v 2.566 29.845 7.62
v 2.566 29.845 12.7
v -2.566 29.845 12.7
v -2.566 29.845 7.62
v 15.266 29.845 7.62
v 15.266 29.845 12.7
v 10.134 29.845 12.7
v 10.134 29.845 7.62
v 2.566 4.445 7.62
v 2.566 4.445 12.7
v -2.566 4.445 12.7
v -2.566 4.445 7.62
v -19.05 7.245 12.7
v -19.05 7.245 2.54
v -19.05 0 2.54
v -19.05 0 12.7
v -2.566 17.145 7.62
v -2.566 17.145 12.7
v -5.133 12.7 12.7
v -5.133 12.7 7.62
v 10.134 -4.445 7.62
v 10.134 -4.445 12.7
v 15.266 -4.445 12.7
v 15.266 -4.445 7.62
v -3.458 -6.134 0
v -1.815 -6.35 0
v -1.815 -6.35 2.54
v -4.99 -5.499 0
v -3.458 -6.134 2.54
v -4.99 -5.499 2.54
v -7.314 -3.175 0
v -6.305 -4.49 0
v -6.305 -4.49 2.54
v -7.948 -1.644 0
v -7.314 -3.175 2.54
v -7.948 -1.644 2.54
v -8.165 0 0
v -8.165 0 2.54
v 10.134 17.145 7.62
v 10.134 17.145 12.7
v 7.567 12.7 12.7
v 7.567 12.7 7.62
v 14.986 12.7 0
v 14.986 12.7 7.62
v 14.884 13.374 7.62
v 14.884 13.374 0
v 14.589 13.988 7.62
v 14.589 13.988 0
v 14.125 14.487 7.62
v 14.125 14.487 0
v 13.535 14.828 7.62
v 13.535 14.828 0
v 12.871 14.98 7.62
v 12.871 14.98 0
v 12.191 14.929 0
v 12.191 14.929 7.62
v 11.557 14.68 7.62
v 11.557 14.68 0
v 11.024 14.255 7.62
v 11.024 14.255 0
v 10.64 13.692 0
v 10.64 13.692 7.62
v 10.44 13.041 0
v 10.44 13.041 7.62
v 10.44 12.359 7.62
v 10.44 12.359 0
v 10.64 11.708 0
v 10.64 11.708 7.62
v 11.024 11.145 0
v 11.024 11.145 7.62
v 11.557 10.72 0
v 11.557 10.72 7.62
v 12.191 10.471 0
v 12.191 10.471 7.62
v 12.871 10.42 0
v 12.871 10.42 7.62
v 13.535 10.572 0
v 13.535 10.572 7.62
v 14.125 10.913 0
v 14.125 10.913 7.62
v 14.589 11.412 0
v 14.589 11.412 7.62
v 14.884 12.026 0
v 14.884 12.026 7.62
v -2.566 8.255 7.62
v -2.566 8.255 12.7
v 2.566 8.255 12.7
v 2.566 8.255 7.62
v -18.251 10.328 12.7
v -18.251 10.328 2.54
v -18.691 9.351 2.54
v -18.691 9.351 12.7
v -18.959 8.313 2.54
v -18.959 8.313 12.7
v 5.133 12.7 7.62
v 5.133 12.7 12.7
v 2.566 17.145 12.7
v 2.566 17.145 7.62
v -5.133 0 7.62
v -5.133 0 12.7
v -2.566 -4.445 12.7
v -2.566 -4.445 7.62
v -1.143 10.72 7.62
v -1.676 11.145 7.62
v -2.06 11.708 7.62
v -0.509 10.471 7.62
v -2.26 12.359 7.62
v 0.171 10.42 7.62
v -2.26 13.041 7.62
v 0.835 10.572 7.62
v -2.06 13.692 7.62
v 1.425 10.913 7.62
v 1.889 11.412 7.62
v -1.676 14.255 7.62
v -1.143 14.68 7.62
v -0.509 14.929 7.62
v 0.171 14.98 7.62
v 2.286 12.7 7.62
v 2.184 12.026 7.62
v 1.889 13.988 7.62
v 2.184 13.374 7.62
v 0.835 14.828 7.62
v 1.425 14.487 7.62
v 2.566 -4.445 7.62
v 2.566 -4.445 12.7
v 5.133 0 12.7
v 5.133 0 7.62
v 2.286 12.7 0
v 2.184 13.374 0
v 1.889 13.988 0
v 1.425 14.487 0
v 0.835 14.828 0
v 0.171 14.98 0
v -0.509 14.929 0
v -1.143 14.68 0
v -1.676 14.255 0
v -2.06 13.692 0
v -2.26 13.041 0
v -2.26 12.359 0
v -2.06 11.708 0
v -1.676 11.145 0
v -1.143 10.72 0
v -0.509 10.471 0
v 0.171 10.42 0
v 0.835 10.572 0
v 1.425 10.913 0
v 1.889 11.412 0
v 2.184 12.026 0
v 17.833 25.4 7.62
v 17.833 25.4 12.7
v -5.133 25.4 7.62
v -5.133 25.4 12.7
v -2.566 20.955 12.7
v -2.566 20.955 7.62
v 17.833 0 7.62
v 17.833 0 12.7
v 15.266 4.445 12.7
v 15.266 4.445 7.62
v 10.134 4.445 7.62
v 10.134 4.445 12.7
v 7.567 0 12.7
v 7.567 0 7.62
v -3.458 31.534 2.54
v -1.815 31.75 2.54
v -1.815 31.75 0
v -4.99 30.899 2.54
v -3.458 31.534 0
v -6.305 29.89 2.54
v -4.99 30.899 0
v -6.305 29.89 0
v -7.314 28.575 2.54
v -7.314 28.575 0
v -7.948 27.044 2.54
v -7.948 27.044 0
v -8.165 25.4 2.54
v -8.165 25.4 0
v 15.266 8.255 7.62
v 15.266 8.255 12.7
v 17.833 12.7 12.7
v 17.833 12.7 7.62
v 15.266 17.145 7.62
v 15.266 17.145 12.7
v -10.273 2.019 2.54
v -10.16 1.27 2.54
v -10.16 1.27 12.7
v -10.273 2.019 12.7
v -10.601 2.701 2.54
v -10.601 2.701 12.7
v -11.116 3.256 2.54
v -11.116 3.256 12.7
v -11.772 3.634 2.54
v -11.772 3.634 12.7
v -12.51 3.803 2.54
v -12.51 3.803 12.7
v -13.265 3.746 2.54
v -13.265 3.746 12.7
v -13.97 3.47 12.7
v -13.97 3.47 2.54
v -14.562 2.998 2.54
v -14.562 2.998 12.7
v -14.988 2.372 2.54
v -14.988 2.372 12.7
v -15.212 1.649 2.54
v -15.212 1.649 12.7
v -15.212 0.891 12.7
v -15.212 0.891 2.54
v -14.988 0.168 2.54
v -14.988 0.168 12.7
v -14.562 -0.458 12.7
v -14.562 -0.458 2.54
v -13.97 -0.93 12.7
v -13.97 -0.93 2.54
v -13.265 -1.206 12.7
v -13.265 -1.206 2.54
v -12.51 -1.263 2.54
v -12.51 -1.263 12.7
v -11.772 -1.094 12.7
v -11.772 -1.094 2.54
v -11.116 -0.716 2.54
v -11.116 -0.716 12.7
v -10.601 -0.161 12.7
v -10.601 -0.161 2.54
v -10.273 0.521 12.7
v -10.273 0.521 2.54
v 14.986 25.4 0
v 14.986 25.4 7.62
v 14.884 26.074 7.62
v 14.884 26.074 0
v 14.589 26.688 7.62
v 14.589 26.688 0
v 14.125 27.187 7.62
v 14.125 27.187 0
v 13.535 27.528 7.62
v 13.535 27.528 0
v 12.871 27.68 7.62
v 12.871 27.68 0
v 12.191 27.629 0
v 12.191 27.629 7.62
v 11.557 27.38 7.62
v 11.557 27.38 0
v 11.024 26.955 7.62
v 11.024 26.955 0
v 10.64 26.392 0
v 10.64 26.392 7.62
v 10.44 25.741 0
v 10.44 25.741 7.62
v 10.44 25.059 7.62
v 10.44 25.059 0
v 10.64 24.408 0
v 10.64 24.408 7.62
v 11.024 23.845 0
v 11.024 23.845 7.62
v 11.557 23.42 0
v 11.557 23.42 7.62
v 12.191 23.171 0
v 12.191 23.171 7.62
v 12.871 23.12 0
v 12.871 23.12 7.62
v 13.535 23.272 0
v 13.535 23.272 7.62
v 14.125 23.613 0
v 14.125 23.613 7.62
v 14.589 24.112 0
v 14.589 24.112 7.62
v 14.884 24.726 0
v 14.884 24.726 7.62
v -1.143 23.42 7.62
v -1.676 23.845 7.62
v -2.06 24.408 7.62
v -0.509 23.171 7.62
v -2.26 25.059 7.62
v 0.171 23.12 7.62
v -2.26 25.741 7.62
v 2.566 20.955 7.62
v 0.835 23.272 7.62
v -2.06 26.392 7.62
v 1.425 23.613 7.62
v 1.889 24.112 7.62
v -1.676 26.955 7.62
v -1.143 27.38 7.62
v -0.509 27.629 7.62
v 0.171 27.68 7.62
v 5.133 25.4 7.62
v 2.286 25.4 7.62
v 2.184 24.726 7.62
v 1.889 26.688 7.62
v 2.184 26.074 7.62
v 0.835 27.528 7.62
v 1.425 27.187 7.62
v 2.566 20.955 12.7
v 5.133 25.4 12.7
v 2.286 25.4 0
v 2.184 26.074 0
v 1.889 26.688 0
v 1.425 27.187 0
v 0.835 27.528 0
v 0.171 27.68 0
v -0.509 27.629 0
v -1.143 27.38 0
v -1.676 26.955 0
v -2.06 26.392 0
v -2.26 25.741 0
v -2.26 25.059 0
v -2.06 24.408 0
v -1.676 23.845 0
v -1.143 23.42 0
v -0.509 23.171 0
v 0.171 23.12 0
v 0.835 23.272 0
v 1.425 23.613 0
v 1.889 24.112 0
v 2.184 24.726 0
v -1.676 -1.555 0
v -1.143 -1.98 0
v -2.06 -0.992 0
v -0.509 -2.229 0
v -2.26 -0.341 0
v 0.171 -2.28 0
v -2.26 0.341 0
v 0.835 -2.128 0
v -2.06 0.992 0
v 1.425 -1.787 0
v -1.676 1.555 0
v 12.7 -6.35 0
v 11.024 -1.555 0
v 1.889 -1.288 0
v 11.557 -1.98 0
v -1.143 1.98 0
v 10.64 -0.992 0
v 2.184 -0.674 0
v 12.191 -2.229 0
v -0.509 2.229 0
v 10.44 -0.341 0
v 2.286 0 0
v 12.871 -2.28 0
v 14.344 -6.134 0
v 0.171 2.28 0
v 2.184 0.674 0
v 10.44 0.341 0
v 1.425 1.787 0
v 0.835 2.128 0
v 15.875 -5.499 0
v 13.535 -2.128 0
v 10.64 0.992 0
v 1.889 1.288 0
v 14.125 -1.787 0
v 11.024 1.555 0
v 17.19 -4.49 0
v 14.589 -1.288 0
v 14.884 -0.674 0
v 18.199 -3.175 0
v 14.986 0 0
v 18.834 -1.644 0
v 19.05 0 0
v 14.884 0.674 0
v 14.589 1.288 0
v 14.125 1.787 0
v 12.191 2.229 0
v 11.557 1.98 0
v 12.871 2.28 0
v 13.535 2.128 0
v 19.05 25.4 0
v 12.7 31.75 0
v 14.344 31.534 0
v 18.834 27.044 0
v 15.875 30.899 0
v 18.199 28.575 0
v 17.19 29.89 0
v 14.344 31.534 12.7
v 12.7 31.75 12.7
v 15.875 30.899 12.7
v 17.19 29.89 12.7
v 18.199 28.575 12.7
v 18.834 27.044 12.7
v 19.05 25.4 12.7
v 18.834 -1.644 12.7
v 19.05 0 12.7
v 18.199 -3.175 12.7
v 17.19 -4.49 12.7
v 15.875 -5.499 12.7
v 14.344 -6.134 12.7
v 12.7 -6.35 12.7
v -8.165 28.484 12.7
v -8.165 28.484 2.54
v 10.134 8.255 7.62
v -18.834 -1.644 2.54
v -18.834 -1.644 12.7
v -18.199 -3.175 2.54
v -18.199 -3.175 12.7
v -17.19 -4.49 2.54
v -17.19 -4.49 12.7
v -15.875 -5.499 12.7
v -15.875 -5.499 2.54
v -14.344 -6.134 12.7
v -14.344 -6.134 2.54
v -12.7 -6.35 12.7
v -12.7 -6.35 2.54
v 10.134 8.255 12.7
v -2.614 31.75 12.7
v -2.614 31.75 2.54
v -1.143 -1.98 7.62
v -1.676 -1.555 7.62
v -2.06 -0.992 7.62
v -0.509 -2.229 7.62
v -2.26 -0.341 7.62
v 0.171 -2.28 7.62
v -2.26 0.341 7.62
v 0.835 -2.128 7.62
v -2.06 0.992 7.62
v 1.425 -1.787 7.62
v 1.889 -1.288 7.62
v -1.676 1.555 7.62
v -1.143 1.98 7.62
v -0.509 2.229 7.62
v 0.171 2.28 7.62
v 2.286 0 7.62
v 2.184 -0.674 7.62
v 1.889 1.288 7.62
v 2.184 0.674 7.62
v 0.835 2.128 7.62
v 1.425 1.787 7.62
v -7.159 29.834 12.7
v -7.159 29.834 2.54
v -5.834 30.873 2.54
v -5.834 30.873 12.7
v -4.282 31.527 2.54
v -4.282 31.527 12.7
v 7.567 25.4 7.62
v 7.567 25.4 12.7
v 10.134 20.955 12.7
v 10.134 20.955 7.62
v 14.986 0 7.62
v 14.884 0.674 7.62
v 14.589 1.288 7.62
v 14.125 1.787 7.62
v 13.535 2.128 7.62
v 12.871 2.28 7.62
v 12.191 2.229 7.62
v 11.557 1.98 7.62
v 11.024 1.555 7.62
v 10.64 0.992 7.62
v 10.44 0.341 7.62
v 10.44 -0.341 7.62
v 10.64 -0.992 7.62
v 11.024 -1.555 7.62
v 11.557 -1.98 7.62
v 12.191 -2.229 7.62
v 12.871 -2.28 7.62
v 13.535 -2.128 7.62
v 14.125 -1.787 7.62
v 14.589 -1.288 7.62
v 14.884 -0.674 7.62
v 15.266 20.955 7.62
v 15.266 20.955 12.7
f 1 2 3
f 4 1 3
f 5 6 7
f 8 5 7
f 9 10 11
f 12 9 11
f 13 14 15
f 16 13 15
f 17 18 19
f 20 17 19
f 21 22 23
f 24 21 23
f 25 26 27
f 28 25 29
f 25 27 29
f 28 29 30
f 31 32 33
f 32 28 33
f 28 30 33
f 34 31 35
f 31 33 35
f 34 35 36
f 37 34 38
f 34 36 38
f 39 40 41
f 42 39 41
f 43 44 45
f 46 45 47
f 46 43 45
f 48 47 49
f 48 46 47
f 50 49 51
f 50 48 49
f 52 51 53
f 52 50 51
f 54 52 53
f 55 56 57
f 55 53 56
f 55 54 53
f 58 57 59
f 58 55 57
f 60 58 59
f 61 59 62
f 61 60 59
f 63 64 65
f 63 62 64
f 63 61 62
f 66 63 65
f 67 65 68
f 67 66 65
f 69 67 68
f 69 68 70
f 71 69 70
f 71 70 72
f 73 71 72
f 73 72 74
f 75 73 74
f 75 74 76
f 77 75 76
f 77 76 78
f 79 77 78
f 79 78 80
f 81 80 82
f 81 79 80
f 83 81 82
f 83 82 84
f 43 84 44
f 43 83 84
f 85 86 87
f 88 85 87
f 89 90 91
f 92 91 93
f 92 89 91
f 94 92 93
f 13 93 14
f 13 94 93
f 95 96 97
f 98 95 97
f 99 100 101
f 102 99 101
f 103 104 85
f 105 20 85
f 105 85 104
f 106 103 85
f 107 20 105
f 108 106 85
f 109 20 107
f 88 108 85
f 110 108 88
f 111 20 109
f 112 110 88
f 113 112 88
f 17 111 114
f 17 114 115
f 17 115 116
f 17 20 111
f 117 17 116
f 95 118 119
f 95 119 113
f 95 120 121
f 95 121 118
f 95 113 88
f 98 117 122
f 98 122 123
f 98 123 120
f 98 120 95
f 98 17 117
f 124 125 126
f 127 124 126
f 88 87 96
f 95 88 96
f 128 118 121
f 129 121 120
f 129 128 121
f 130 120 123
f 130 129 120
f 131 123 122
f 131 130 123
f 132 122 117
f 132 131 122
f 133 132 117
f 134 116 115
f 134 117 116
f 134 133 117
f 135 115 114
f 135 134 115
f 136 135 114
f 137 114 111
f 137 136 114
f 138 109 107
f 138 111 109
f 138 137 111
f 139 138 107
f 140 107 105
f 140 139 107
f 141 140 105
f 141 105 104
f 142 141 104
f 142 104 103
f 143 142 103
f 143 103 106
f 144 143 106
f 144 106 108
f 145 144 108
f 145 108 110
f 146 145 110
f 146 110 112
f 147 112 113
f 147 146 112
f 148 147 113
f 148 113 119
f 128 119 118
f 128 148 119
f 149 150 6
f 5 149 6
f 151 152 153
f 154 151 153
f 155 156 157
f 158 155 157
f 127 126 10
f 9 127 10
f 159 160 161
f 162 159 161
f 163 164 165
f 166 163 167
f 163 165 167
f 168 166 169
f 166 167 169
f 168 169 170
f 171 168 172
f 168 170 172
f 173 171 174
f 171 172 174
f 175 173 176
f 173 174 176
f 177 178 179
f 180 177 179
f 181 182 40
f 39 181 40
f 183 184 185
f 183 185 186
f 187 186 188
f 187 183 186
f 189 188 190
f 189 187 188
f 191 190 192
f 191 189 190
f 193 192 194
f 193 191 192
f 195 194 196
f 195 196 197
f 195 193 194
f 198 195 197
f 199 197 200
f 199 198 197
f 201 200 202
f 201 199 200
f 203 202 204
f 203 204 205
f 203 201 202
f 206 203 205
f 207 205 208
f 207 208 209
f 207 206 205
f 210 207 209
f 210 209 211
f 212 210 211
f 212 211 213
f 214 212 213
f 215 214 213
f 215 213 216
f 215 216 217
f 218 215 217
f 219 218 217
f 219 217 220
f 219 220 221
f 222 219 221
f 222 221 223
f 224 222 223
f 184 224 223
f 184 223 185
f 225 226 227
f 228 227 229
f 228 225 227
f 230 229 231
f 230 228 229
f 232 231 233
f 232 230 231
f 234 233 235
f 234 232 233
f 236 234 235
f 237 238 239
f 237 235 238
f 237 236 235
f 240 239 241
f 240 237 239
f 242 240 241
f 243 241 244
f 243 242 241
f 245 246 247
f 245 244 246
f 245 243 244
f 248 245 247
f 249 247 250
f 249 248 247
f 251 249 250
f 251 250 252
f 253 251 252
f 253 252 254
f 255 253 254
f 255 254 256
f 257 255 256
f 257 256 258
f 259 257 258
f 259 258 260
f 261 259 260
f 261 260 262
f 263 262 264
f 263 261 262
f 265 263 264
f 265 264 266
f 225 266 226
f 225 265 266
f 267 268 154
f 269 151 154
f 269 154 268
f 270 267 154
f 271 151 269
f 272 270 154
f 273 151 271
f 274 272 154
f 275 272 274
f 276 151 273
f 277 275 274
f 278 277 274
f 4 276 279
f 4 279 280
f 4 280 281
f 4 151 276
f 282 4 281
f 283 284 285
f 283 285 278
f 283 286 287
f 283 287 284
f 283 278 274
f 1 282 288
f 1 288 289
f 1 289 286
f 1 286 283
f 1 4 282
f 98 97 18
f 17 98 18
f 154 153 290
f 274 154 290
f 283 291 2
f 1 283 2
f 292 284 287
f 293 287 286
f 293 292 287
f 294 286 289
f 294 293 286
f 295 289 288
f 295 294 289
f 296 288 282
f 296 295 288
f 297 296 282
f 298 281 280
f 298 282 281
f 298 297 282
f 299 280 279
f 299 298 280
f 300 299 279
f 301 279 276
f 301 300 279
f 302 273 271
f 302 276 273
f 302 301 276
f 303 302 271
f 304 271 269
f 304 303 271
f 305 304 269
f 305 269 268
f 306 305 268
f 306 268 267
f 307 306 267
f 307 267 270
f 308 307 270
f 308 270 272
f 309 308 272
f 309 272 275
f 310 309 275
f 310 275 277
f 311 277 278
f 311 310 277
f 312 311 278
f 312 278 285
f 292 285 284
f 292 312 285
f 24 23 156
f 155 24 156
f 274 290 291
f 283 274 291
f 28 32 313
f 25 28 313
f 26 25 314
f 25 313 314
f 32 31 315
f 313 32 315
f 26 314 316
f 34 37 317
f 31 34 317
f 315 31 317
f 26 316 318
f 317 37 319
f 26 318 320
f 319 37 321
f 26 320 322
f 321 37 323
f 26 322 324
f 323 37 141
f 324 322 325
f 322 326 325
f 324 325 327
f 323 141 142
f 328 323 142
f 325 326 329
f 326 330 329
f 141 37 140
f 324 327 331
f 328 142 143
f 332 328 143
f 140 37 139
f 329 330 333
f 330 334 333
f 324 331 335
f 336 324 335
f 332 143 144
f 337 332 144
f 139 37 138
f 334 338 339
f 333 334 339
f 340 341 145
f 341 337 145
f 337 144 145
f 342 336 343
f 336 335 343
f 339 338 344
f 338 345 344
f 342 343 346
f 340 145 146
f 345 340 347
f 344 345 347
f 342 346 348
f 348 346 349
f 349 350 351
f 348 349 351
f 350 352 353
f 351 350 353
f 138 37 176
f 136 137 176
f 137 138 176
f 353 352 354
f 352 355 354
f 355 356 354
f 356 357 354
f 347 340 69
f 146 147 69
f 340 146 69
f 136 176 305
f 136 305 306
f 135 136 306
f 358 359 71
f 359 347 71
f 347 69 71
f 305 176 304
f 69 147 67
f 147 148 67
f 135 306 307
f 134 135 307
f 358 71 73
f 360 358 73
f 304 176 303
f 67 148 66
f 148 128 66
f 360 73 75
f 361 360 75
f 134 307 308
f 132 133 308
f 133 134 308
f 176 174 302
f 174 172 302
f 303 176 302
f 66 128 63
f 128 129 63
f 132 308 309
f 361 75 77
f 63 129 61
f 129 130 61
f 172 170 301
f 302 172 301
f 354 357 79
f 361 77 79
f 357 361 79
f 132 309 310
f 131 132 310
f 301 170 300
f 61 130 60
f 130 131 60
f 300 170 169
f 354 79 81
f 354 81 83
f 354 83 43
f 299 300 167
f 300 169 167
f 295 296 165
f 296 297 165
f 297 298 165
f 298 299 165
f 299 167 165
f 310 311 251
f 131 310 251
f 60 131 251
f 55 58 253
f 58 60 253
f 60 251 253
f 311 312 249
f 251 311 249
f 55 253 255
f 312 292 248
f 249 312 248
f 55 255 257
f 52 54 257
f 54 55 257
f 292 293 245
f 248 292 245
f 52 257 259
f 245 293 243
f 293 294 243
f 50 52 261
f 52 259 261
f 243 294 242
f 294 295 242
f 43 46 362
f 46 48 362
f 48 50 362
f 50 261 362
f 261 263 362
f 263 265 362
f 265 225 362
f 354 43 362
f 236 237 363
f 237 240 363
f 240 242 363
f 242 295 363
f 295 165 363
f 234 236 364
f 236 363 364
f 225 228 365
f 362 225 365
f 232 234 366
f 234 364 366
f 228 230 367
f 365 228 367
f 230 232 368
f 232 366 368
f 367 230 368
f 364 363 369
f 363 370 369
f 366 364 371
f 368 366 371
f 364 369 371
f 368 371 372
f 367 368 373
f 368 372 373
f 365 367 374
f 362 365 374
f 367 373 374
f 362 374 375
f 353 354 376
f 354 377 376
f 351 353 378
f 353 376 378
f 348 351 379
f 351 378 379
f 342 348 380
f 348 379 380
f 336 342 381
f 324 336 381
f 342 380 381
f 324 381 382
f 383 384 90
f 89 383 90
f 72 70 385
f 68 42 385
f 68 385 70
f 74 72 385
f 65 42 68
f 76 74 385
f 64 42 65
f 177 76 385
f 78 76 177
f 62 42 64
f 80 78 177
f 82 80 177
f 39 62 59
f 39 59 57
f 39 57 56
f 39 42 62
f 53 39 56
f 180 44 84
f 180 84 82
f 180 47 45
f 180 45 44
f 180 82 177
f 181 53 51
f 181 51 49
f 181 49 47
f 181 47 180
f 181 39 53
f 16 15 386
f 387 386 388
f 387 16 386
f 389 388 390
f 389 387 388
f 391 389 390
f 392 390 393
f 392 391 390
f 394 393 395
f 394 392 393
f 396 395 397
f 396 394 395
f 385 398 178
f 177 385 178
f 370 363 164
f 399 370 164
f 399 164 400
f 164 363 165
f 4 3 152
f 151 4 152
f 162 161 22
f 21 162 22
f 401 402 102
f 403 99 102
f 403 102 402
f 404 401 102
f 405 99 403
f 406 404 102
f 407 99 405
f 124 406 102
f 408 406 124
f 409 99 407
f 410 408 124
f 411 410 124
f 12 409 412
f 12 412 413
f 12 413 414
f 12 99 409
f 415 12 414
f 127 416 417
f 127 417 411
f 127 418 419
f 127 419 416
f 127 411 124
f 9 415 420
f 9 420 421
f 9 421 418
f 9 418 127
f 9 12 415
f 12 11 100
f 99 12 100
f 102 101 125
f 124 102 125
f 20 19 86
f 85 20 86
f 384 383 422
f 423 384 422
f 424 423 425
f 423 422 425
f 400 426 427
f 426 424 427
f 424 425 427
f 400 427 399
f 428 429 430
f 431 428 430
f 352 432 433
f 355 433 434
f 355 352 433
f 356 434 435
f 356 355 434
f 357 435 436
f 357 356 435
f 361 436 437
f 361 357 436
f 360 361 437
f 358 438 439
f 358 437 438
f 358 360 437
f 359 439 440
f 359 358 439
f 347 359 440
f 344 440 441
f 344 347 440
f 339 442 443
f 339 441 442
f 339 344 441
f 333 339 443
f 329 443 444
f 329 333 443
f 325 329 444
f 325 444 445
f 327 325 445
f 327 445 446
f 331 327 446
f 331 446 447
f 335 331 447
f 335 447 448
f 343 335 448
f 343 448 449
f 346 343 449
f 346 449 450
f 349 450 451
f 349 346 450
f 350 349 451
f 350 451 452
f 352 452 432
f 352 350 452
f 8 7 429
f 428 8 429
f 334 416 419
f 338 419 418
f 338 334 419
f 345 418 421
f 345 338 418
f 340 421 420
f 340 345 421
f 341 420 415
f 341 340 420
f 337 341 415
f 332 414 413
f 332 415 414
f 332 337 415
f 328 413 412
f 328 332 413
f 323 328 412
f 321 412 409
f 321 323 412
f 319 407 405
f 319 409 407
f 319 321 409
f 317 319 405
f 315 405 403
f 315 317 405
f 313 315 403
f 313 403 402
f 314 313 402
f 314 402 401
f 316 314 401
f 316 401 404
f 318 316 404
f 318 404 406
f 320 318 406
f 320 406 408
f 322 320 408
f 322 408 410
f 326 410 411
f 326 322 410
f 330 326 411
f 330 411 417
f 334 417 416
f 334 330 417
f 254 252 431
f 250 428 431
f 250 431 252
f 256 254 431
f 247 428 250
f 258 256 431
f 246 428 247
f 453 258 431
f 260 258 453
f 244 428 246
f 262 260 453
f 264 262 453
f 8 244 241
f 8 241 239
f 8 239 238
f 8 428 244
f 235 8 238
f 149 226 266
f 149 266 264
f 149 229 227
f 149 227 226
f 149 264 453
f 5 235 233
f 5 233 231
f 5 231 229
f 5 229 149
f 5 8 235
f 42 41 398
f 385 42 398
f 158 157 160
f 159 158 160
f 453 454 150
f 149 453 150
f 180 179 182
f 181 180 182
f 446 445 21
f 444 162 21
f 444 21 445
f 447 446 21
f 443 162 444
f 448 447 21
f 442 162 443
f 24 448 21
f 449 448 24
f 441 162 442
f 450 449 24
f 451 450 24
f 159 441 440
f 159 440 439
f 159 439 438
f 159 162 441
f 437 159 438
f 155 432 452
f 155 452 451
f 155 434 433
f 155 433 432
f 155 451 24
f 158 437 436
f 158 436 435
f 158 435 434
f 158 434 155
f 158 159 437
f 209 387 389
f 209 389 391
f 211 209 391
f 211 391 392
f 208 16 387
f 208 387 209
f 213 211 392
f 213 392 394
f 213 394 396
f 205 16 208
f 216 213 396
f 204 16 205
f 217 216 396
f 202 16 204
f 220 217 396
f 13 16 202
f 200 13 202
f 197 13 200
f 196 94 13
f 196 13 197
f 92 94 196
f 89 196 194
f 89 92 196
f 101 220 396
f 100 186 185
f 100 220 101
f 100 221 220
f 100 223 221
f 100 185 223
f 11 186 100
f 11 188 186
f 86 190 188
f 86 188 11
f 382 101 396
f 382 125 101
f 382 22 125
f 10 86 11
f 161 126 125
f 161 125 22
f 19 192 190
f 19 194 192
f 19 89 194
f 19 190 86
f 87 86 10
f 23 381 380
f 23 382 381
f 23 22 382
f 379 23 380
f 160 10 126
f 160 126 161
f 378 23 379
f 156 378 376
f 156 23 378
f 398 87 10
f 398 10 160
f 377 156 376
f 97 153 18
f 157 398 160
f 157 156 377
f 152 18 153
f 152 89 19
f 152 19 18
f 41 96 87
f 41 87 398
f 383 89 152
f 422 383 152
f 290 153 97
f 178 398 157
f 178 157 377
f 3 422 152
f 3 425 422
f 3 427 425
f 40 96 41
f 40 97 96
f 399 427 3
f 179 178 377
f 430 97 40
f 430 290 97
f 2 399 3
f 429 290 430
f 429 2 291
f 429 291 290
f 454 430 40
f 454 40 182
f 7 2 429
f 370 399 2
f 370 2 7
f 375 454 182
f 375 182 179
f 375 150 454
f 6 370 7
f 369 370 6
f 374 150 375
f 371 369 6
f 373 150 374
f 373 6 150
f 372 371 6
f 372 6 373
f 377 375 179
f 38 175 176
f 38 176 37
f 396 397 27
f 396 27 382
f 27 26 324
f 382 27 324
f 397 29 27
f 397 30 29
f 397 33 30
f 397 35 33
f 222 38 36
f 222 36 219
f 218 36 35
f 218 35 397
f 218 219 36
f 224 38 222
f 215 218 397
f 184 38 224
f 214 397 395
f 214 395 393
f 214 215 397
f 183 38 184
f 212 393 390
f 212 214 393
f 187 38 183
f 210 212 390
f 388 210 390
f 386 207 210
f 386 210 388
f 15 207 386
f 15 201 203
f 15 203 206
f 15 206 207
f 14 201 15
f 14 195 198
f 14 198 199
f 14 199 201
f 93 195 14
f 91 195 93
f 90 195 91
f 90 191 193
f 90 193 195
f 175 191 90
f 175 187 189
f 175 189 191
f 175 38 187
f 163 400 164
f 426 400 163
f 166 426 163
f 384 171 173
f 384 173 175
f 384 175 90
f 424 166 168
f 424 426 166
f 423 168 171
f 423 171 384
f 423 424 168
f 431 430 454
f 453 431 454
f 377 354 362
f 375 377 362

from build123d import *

# Parameters (mm, degrees)
SKETCH1_R           = 2.286
SKETCH1_R_2         = 2.54
BOSS_EXTRUDE1_DEPTH = 12.7
FILLET1_R           = 6.35
CUT_EXTRUDE1_DEPTH  = 5.08
CUT_EXTRUDE2_START  = -2.54
SKETCH3_R           = 2.54
CUT_EXTRUDE2_DEPTH  = 2.54
FILLET2_R           = 6.35


with BuildPart() as part:
    # Sketch1 → Boss-Extrude1 (new body)
    with BuildSketch(Plane.XY):
        Polygon((-6.35, 31.75), (-19.05, 8.89), (-19.05, -6.35), (-6.35, -6.35), (19.05, -6.35), (19.05, 31.75), align=None)
        Circle(SKETCH1_R, mode=Mode.SUBTRACT)
        with Locations((-12.7, 1.27)):
            Circle(SKETCH1_R_2, mode=Mode.SUBTRACT)
        with Locations((12.7, 0)):
            Circle(SKETCH1_R, mode=Mode.SUBTRACT)
        with Locations((12.7, 12.7)):
            Circle(SKETCH1_R, mode=Mode.SUBTRACT)
        with Locations((12.7, 25.4)):
            Circle(SKETCH1_R, mode=Mode.SUBTRACT)
        with Locations((0, 12.7)):
            Circle(SKETCH1_R, mode=Mode.SUBTRACT)
        with Locations((0, 25.4)):
            Circle(SKETCH1_R, mode=Mode.SUBTRACT)
    extrude(amount=BOSS_EXTRUDE1_DEPTH)

    # Fillet1
    fillet1_edges = [part.edges().sort_by_distance(p)[0] for p in [
        (-19.05, -6.35, 6.35),
        (-19.05, 8.89, 6.35),
        (-6.35, 31.75, 6.35),
        (19.05, 31.75, 6.35),
        (19.05, -6.35, 6.35),
    ]]
    fillet(fillet1_edges, radius=FILLET1_R)

    # Sketch2 → Cut-Extrude1 (cut)
    with BuildSketch(Plane.XY.offset(12.7)):
        Polygon((17.832643893, 0), (15.266321947, 4.445), (10.133678053, 4.445), (7.567356107, 0), (10.133678053, -4.445), (15.266321947, -4.445), align=None)
        Polygon((5.132643893, 0), (2.566321947, 4.445), (-2.566321947, 4.445), (-5.132643893, 0), (-2.566321947, -4.445), (2.566321947, -4.445), align=None)
        Polygon((17.832643893, 12.7), (15.266321947, 17.145), (10.133678053, 17.145), (7.567356107, 12.7), (10.133678053, 8.255), (15.266321947, 8.255), align=None)
        Polygon((17.832643893, 25.4), (15.266321947, 29.845), (10.133678053, 29.845), (7.567356107, 25.4), (10.133678053, 20.955), (15.266321947, 20.955), align=None)
        Polygon((5.132643893, 12.7), (2.566321947, 17.145), (-2.566321947, 17.145), (-5.132643893, 12.7), (-2.566321947, 8.255), (2.566321947, 8.255), align=None)
        Polygon((5.132643893, 25.4), (2.566321947, 29.845), (-2.566321947, 29.845), (-5.132643893, 25.4), (-2.566321947, 20.955), (2.566321947, 20.955), align=None)
    extrude(amount=-CUT_EXTRUDE1_DEPTH, mode=Mode.SUBTRACT)

    # Sketch3 → Cut-Extrude2 (cut)
    with BuildSketch(Plane(origin=(0, 0, 0), x_dir=(-1, 0, 0), z_dir=(0, 0, -1)).offset(CUT_EXTRUDE2_START)):
        with BuildLine():
            Line((18.250898703, 10.328382334), (8.164537437, 28.483832613))
            Line((8.164537437, 28.483832613), (8.164537437, -6.35))
            Line((8.164537437, -6.35), (12.7, -6.35))
            ThreePointArc((12.7, -6.35), (17.190128061, -4.490128061), (19.05, 0))
            Line((19.05, 0), (19.05, 7.244549721))
            ThreePointArc((19.05, 7.244549721), (18.846979208, 8.837392029), (18.250898703, 10.328382334))
        make_face()
        with Locations((12.7, 1.27)):
            Circle(SKETCH3_R, mode=Mode.SUBTRACT)
    extrude(amount=CUT_EXTRUDE2_DEPTH, mode=Mode.SUBTRACT)

    # Fillet2
    # the kernel refuses this fillet: 6.35 mm, written as the material it takes off along each edge
    with BuildSketch(Plane(origin=(-8.164537437, -6.35, 2.54), x_dir=(1, 0, 0), z_dir=(0, 0, -1))) as fillet2_piece_1:
        with BuildLine():
            CenterArc((FILLET2_R, -FILLET2_R), FILLET2_R, 90, 90)
            Line((0, -FILLET2_R), (0, 0))
            Line((0, 0), (FILLET2_R, 0))
        make_face()
    extrude(amount=18.415, mode=Mode.SUBTRACT)
    with BuildSketch(Plane(origin=(-8.164537437, 28.483832613, -17.851881799), x_dir=(0.8892619937285123, 0.45739819250844366, 0), z_dir=(0, 0, 1))) as fillet2_piece_2:
        with BuildLine():
            CenterArc((4.236274197, -5.64681366), FILLET2_R, 62.780655364, 90)
            Line((-1.410539463, -2.742335138), (-1.975220829, -2.451887286))
            Line((-1.975220829, -2.451887286), (-0.564681366, 0.290447852))
            Line((-0.564681366, 0.290447852), (-0.352566378, 0.528130617))
            ThreePointArc((-0.352566378, 0.528130617), (6.720590159, 0.930188855), (7.431200572, 0.564681366))
            Line((7.431200572, 0.564681366), (7.140752719, 0))
        make_face()
    extrude(amount=20.391881799, mode=Mode.SUBTRACT)


solid = part.part
